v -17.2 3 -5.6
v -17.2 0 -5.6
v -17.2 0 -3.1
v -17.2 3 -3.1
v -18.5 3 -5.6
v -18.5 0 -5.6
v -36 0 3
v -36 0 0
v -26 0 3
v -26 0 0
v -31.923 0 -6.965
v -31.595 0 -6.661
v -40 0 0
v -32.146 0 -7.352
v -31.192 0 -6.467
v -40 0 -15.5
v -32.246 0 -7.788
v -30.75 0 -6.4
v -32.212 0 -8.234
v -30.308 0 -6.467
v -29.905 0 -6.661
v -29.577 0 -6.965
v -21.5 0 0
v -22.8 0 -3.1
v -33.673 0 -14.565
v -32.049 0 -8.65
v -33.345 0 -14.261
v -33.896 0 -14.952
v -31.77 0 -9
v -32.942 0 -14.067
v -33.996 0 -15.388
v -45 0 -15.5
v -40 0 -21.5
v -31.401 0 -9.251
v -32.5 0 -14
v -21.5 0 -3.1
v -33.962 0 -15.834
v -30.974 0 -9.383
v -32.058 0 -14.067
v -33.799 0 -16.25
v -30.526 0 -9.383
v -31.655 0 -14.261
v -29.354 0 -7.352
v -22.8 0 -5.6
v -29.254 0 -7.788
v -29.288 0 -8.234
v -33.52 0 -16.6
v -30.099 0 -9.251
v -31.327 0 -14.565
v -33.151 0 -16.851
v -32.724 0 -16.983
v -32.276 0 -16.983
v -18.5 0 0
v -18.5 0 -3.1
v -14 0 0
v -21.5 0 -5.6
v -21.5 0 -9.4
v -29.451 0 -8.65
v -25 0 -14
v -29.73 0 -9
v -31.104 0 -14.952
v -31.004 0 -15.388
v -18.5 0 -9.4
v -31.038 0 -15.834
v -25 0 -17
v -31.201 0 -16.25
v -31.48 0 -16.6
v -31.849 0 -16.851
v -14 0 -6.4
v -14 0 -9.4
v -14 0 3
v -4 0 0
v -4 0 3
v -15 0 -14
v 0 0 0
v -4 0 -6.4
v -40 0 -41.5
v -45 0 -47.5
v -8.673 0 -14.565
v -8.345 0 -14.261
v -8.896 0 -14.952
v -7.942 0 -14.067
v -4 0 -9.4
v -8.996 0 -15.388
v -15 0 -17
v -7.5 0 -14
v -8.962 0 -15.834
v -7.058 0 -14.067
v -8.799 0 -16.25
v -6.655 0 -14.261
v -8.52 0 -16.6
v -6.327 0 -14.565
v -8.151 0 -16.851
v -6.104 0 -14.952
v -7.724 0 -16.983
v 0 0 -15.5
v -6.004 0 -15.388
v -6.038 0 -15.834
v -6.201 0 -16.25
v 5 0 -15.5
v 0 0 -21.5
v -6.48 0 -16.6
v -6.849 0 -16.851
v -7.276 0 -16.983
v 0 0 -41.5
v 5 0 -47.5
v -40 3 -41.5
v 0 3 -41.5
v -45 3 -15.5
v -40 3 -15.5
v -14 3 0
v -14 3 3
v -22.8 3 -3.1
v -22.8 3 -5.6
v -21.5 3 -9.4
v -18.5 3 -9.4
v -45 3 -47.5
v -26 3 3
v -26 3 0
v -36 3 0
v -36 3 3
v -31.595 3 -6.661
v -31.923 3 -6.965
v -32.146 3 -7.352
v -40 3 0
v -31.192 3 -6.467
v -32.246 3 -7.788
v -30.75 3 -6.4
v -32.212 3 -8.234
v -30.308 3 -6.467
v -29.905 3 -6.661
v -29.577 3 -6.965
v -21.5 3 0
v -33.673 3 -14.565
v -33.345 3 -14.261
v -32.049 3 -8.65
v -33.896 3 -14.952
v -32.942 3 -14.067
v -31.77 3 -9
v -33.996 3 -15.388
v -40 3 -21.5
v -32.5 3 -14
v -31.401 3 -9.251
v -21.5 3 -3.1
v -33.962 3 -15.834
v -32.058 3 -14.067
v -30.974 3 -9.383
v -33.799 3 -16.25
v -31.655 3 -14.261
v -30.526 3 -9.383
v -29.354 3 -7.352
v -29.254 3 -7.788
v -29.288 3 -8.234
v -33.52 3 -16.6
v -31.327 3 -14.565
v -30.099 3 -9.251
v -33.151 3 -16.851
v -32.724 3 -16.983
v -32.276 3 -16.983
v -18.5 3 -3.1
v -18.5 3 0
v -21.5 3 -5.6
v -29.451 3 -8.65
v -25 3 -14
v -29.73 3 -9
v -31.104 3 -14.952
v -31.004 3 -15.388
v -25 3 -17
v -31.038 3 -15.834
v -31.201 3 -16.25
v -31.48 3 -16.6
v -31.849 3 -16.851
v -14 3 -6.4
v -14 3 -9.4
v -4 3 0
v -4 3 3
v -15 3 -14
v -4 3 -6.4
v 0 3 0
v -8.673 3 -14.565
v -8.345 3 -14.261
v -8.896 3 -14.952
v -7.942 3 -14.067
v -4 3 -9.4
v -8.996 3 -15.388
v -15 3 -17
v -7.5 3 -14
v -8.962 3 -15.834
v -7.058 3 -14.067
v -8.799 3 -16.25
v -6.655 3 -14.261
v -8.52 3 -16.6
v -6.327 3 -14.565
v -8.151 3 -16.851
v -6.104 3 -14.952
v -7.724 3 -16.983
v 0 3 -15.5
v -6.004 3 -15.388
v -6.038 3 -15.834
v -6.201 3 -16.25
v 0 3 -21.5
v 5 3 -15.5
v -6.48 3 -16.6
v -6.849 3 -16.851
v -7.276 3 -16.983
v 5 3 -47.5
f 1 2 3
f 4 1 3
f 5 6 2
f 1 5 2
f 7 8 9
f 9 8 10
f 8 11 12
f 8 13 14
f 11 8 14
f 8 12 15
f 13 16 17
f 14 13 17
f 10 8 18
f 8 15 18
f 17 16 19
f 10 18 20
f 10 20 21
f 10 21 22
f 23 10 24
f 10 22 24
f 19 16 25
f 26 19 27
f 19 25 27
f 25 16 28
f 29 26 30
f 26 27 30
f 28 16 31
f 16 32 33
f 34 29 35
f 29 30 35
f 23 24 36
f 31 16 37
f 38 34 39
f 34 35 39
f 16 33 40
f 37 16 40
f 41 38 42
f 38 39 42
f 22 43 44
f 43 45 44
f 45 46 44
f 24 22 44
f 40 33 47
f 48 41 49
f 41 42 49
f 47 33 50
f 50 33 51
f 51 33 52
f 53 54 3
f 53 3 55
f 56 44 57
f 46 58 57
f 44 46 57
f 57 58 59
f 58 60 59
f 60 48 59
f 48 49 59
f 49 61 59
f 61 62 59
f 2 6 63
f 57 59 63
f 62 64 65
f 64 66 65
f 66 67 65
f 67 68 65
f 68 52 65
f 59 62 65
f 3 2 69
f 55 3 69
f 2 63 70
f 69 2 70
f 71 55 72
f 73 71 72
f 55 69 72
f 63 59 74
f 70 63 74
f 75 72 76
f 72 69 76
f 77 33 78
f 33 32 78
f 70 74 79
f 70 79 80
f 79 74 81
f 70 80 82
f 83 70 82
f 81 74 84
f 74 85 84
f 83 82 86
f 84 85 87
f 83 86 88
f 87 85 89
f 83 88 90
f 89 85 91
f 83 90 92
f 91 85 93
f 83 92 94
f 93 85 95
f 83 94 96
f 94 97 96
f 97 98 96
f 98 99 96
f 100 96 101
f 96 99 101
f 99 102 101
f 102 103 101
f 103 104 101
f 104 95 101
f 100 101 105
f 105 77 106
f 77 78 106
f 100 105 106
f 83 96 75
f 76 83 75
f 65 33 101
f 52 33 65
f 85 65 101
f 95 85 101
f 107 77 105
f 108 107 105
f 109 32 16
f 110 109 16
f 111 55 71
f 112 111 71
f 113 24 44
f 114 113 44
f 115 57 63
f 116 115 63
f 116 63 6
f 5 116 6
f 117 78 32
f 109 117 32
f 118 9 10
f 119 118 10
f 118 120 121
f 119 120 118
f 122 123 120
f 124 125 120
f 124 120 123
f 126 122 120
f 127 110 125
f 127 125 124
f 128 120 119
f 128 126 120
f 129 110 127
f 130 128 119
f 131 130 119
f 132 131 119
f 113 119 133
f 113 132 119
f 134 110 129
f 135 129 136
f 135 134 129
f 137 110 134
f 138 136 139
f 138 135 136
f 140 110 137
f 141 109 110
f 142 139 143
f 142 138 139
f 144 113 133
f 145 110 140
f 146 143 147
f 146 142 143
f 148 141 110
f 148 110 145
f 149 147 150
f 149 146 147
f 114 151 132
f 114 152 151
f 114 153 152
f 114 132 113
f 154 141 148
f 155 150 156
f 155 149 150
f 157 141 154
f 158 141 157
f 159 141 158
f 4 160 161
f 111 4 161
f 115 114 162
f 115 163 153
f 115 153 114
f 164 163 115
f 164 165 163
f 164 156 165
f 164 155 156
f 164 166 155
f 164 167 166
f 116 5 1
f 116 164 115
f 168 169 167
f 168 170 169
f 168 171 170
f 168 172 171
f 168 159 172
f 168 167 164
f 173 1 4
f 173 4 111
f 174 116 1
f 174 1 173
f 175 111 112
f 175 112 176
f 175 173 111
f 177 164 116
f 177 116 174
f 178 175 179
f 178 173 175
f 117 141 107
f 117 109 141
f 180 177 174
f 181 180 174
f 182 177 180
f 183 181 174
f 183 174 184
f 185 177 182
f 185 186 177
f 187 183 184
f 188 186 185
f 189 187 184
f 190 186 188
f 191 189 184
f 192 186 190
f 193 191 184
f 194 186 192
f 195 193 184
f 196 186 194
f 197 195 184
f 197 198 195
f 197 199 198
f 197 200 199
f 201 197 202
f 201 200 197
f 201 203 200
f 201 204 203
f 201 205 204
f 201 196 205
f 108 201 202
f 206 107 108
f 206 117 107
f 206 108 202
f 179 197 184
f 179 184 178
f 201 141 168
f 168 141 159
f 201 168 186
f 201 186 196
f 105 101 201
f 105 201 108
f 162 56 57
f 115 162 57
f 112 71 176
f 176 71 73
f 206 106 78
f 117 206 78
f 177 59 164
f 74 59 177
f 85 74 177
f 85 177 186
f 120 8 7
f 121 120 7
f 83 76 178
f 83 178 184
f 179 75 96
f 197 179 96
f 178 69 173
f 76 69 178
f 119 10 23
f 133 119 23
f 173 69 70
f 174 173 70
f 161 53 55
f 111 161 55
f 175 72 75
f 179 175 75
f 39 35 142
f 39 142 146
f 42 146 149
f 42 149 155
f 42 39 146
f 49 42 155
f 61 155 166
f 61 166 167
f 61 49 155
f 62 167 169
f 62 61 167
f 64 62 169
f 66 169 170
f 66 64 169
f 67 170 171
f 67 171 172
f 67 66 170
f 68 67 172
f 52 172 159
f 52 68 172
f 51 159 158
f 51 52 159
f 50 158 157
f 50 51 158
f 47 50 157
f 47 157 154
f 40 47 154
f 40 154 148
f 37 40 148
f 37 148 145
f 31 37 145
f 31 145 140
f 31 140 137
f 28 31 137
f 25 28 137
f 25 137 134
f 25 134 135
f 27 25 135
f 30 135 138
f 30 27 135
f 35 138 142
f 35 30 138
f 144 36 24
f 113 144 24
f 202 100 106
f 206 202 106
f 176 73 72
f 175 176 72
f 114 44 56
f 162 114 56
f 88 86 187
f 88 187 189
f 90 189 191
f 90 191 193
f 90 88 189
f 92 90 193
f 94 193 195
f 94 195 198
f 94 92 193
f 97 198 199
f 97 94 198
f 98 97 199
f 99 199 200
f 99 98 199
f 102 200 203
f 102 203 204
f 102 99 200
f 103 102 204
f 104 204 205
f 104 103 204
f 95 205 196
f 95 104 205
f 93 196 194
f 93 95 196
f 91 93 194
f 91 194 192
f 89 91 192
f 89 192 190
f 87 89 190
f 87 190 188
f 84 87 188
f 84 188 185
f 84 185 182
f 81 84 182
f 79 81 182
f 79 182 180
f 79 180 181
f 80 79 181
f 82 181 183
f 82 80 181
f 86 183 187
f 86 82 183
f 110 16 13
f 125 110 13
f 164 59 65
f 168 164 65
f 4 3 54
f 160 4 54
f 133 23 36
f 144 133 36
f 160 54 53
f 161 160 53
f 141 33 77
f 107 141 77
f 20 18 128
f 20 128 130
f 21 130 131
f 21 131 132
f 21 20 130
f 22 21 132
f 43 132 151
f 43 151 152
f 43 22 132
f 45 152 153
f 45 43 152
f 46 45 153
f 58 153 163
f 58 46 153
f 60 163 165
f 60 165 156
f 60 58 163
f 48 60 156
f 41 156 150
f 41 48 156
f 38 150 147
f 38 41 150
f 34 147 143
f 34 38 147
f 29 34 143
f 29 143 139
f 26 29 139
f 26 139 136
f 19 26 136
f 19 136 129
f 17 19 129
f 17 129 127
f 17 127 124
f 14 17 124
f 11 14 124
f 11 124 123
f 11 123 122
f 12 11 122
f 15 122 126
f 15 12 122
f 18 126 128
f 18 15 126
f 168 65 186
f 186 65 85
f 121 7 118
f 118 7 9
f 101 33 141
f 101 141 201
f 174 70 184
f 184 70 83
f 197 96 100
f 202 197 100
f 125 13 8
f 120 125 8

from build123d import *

# Parameters (mm, degrees)
SKETCH2_R           = 1.5
SKETCH2_W           = 40
SKETCH2_H           = 20
SKETCH2_W_2         = 10
SKETCH2_H_2         = 3
BOSS_EXTRUDE1_DEPTH = 3


with BuildPart() as part:
    # Sketch2 → Boss-Extrude1 (new body)
    with BuildSketch(Plane(origin=(0, 0, 0), x_dir=(1, 0, 0), z_dir=(0, 1, 0))):
        Polygon((0, 15.5), (5, 15.5), (5, 47.5), (-45, 47.5), (-45, 15.5), (-40, 15.5), (-40, 0), (-36, 0), (-36, -3), (-26, -3), (-26, 0), (-21.5, 0), (-21.5, 3.1), (-22.8, 3.1), (-22.8, 5.6), (-21.5, 5.6), (-21.5, 9.4), (-18.5, 9.4), (-18.5, 5.6), (-17.2, 5.6), (-17.2, 3.1), (-18.5, 3.1), (-18.5, 0), (-14, 0), (-14, -3), (-4, -3), (-4, 0), (0, 0), align=None)
        with Locations(Location((-7.5, 15.5, 0), (0, 0, 270))):
            Circle(SKETCH2_R, mode=Mode.SUBTRACT)
        with Locations(Location((-32.5, 15.5, 0), (0, 0, 270))):
            Circle(SKETCH2_R, mode=Mode.SUBTRACT)
        with Locations(Location((-30.75, 7.9, 0), (0, 0, 270))):
            Circle(SKETCH2_R, mode=Mode.SUBTRACT)
        with Locations((-20, 31.5)):
            Rectangle(SKETCH2_W, SKETCH2_H, mode=Mode.SUBTRACT)
        with Locations((-20, 15.5)):
            Rectangle(SKETCH2_W_2, SKETCH2_H_2, mode=Mode.SUBTRACT)
        with Locations((-9, 7.9)):
            Rectangle(SKETCH2_W_2, SKETCH2_H_2, mode=Mode.SUBTRACT)
    extrude(amount=BOSS_EXTRUDE1_DEPTH)


solid = part.part
